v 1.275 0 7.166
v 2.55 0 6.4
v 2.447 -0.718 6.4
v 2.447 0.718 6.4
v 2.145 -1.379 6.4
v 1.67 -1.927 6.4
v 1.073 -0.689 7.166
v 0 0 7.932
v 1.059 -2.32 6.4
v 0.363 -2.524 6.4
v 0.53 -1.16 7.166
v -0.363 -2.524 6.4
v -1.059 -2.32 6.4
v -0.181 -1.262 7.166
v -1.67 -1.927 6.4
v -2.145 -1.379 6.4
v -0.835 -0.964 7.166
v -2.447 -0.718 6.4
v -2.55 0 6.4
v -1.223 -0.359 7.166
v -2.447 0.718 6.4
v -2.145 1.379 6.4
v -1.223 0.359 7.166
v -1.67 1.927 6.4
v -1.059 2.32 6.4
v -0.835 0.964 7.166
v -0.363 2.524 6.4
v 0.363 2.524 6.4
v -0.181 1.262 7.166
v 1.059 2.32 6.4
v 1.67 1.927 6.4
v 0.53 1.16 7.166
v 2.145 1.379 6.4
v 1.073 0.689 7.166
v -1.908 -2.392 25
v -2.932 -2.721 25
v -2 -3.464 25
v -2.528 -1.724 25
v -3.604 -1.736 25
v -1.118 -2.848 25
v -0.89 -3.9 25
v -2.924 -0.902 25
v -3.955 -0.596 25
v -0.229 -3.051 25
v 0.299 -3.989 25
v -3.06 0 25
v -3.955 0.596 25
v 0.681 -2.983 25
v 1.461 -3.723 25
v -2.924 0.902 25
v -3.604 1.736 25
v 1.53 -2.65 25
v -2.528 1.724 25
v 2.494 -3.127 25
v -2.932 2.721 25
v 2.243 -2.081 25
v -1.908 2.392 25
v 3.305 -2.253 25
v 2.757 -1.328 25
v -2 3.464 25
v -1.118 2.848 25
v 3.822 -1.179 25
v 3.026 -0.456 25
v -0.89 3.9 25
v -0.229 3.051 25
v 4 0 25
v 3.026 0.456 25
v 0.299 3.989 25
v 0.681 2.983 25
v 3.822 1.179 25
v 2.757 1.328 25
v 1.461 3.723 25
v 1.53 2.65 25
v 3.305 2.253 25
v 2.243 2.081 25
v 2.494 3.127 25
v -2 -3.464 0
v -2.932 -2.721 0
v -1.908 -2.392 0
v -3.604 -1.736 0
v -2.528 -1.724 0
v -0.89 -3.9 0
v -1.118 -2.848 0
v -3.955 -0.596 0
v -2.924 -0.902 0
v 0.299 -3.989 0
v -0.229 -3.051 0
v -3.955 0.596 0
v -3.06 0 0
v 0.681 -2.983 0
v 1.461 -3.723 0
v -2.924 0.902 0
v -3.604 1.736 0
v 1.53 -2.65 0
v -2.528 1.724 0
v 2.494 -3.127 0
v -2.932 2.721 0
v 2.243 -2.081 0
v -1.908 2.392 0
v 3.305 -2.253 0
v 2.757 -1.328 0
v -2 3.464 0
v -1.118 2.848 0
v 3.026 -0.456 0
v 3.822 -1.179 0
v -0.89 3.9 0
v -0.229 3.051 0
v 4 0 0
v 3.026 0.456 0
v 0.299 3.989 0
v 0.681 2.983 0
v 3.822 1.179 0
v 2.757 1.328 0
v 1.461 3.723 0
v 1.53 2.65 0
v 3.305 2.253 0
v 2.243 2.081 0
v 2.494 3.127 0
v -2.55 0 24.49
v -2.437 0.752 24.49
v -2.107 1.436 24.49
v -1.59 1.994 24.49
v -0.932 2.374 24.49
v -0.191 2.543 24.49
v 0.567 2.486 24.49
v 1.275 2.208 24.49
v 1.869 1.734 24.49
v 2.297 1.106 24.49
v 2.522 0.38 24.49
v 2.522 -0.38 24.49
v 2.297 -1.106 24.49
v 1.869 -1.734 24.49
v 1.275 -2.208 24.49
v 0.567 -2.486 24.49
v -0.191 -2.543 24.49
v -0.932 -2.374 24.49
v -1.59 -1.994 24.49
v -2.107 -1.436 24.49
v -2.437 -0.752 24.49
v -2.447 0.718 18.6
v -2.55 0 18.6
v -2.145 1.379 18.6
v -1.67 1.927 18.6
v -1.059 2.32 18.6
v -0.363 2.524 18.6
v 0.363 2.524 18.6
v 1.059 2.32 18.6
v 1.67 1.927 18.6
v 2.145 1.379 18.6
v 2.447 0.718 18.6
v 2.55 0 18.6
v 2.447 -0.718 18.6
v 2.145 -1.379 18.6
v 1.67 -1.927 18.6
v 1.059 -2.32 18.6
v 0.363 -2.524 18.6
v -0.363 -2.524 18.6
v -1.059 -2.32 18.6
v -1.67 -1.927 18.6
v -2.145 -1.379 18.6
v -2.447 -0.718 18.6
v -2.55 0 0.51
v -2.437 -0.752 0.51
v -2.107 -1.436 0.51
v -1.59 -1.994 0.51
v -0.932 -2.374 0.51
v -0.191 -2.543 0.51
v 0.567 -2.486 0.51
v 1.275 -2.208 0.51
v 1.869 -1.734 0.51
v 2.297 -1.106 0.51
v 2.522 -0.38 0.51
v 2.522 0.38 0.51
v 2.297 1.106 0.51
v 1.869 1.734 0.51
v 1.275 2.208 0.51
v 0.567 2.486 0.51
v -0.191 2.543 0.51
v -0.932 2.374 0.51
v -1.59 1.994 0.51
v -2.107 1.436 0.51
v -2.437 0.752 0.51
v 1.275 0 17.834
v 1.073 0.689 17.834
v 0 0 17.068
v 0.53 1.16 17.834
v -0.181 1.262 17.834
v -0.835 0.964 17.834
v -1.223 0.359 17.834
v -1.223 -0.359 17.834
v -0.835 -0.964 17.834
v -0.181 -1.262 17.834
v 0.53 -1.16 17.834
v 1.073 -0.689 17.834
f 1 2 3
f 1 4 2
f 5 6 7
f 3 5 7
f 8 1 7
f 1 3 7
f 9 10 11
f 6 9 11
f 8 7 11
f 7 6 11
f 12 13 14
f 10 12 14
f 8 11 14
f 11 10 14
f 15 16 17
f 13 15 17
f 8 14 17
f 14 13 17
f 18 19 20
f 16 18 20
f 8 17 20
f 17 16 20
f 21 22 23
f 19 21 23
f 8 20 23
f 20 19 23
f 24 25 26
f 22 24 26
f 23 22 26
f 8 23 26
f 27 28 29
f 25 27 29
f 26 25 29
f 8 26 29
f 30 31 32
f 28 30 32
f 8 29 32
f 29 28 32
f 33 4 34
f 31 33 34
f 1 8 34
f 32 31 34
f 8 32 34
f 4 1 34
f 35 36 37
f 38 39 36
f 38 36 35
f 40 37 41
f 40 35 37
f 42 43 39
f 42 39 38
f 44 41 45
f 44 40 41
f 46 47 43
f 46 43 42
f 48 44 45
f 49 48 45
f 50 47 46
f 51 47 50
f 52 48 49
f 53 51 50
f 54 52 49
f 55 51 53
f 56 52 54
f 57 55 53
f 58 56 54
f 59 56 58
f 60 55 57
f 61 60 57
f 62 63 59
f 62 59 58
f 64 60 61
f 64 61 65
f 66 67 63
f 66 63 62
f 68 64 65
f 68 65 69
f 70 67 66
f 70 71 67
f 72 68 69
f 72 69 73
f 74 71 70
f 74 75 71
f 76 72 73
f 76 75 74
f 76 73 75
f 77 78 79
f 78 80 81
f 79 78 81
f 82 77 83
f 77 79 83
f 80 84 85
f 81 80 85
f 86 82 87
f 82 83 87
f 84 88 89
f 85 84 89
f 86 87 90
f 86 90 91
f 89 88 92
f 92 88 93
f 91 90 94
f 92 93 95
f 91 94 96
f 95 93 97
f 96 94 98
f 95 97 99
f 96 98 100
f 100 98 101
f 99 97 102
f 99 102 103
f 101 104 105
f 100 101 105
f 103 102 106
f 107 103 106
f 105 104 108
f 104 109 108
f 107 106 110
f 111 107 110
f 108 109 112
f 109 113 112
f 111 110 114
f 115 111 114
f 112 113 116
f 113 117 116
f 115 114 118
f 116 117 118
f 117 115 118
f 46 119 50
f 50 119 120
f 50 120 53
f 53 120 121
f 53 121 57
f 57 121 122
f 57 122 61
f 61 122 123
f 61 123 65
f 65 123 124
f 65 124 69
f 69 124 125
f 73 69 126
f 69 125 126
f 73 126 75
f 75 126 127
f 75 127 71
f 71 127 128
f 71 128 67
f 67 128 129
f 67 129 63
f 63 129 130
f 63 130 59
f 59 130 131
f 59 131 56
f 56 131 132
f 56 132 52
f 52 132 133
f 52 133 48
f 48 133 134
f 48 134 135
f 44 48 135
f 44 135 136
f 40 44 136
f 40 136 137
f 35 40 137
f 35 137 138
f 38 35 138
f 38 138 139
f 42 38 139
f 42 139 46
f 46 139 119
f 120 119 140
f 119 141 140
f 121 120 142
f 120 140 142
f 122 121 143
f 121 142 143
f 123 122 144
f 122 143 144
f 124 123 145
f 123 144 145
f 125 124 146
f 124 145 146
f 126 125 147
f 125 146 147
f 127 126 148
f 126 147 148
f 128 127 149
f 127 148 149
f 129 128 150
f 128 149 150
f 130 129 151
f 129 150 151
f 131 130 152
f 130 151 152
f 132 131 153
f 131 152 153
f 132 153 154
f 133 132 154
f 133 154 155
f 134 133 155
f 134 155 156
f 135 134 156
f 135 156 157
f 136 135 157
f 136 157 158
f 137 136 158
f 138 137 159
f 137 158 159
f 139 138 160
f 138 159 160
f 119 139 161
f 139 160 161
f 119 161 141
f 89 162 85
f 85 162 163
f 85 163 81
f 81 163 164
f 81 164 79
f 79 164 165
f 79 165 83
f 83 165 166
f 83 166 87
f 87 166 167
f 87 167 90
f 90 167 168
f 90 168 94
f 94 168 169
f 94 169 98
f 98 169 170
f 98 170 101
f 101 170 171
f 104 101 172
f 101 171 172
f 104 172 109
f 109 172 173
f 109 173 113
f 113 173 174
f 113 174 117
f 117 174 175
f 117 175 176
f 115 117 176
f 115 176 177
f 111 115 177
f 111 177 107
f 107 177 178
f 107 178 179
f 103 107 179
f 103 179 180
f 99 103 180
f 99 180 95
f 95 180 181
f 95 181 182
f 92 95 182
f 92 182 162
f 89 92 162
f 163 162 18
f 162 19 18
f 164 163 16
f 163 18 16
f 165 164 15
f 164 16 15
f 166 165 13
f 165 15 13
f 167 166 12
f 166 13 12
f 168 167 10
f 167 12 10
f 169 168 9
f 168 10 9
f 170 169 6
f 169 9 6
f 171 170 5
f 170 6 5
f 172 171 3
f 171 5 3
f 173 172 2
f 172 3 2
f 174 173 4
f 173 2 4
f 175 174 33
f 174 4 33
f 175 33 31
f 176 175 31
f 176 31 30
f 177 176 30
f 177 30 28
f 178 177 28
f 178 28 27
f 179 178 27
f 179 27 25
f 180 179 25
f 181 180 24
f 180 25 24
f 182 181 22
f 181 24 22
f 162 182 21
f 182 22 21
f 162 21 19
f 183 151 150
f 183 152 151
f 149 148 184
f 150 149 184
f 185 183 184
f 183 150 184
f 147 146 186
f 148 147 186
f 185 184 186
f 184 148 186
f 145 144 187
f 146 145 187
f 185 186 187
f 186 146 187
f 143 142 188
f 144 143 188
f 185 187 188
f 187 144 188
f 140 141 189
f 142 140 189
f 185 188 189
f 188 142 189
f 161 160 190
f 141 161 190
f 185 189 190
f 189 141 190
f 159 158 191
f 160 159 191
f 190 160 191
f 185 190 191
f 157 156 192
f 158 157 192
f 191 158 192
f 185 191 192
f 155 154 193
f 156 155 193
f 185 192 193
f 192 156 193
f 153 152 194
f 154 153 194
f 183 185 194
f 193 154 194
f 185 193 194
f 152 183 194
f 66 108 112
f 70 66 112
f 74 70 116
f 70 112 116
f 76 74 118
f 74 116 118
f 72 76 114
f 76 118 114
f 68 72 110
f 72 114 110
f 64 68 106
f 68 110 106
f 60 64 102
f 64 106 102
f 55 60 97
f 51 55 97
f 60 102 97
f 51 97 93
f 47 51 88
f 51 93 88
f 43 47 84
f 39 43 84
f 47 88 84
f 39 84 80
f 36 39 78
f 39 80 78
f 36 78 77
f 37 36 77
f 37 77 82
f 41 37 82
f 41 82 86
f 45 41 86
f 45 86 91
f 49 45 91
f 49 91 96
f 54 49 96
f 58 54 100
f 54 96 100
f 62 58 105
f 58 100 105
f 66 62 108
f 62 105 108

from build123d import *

# Parameters (mm, degrees)
F3_R           = 4
F4_DEPTH       = 25
F6_D           = 5.1
F6_DEPTH       = 6.4
F6_CSINK_D     = 6.12
F6_CSINK_ANGLE = 90
F6_TIP         = 1.5321945785
F7_D           = 5.1
F7_DEPTH       = 6.4
F7_CSINK_D     = 6.12
F7_CSINK_ANGLE = 90
F7_TIP         = 1.5321945785


with BuildPart() as f4:
    # F3 (on Top) → F4 (new body)
    with BuildSketch(Plane.XY):
        Circle(F3_R)
    extrude(amount=F4_DEPTH)

    # F6
    with Locations(Plane.XY.offset(25)):
        with Locations((0, 0)):
            CounterSinkHole(F6_D / 2, F6_CSINK_D / 2, depth=F6_DEPTH, counter_sink_angle=F6_CSINK_ANGLE)
            with Locations((0, 0, -(F6_DEPTH + F6_TIP / 2))):  # 118° drill point
                Cone(0, F6_D / 2, F6_TIP, mode=Mode.SUBTRACT)

    # F7
    with Locations(Plane(origin=(0, 0, 0), x_dir=(1, 0, 0), z_dir=(0, 0, -1))):
        with Locations((0, 0)):
            CounterSinkHole(F7_D / 2, F7_CSINK_D / 2, depth=F7_DEPTH, counter_sink_angle=F7_CSINK_ANGLE)
            with Locations((0, 0, -(F7_DEPTH + F7_TIP / 2))):  # 118° drill point
                Cone(0, F7_D / 2, F7_TIP, mode=Mode.SUBTRACT)


solid = f4.part
